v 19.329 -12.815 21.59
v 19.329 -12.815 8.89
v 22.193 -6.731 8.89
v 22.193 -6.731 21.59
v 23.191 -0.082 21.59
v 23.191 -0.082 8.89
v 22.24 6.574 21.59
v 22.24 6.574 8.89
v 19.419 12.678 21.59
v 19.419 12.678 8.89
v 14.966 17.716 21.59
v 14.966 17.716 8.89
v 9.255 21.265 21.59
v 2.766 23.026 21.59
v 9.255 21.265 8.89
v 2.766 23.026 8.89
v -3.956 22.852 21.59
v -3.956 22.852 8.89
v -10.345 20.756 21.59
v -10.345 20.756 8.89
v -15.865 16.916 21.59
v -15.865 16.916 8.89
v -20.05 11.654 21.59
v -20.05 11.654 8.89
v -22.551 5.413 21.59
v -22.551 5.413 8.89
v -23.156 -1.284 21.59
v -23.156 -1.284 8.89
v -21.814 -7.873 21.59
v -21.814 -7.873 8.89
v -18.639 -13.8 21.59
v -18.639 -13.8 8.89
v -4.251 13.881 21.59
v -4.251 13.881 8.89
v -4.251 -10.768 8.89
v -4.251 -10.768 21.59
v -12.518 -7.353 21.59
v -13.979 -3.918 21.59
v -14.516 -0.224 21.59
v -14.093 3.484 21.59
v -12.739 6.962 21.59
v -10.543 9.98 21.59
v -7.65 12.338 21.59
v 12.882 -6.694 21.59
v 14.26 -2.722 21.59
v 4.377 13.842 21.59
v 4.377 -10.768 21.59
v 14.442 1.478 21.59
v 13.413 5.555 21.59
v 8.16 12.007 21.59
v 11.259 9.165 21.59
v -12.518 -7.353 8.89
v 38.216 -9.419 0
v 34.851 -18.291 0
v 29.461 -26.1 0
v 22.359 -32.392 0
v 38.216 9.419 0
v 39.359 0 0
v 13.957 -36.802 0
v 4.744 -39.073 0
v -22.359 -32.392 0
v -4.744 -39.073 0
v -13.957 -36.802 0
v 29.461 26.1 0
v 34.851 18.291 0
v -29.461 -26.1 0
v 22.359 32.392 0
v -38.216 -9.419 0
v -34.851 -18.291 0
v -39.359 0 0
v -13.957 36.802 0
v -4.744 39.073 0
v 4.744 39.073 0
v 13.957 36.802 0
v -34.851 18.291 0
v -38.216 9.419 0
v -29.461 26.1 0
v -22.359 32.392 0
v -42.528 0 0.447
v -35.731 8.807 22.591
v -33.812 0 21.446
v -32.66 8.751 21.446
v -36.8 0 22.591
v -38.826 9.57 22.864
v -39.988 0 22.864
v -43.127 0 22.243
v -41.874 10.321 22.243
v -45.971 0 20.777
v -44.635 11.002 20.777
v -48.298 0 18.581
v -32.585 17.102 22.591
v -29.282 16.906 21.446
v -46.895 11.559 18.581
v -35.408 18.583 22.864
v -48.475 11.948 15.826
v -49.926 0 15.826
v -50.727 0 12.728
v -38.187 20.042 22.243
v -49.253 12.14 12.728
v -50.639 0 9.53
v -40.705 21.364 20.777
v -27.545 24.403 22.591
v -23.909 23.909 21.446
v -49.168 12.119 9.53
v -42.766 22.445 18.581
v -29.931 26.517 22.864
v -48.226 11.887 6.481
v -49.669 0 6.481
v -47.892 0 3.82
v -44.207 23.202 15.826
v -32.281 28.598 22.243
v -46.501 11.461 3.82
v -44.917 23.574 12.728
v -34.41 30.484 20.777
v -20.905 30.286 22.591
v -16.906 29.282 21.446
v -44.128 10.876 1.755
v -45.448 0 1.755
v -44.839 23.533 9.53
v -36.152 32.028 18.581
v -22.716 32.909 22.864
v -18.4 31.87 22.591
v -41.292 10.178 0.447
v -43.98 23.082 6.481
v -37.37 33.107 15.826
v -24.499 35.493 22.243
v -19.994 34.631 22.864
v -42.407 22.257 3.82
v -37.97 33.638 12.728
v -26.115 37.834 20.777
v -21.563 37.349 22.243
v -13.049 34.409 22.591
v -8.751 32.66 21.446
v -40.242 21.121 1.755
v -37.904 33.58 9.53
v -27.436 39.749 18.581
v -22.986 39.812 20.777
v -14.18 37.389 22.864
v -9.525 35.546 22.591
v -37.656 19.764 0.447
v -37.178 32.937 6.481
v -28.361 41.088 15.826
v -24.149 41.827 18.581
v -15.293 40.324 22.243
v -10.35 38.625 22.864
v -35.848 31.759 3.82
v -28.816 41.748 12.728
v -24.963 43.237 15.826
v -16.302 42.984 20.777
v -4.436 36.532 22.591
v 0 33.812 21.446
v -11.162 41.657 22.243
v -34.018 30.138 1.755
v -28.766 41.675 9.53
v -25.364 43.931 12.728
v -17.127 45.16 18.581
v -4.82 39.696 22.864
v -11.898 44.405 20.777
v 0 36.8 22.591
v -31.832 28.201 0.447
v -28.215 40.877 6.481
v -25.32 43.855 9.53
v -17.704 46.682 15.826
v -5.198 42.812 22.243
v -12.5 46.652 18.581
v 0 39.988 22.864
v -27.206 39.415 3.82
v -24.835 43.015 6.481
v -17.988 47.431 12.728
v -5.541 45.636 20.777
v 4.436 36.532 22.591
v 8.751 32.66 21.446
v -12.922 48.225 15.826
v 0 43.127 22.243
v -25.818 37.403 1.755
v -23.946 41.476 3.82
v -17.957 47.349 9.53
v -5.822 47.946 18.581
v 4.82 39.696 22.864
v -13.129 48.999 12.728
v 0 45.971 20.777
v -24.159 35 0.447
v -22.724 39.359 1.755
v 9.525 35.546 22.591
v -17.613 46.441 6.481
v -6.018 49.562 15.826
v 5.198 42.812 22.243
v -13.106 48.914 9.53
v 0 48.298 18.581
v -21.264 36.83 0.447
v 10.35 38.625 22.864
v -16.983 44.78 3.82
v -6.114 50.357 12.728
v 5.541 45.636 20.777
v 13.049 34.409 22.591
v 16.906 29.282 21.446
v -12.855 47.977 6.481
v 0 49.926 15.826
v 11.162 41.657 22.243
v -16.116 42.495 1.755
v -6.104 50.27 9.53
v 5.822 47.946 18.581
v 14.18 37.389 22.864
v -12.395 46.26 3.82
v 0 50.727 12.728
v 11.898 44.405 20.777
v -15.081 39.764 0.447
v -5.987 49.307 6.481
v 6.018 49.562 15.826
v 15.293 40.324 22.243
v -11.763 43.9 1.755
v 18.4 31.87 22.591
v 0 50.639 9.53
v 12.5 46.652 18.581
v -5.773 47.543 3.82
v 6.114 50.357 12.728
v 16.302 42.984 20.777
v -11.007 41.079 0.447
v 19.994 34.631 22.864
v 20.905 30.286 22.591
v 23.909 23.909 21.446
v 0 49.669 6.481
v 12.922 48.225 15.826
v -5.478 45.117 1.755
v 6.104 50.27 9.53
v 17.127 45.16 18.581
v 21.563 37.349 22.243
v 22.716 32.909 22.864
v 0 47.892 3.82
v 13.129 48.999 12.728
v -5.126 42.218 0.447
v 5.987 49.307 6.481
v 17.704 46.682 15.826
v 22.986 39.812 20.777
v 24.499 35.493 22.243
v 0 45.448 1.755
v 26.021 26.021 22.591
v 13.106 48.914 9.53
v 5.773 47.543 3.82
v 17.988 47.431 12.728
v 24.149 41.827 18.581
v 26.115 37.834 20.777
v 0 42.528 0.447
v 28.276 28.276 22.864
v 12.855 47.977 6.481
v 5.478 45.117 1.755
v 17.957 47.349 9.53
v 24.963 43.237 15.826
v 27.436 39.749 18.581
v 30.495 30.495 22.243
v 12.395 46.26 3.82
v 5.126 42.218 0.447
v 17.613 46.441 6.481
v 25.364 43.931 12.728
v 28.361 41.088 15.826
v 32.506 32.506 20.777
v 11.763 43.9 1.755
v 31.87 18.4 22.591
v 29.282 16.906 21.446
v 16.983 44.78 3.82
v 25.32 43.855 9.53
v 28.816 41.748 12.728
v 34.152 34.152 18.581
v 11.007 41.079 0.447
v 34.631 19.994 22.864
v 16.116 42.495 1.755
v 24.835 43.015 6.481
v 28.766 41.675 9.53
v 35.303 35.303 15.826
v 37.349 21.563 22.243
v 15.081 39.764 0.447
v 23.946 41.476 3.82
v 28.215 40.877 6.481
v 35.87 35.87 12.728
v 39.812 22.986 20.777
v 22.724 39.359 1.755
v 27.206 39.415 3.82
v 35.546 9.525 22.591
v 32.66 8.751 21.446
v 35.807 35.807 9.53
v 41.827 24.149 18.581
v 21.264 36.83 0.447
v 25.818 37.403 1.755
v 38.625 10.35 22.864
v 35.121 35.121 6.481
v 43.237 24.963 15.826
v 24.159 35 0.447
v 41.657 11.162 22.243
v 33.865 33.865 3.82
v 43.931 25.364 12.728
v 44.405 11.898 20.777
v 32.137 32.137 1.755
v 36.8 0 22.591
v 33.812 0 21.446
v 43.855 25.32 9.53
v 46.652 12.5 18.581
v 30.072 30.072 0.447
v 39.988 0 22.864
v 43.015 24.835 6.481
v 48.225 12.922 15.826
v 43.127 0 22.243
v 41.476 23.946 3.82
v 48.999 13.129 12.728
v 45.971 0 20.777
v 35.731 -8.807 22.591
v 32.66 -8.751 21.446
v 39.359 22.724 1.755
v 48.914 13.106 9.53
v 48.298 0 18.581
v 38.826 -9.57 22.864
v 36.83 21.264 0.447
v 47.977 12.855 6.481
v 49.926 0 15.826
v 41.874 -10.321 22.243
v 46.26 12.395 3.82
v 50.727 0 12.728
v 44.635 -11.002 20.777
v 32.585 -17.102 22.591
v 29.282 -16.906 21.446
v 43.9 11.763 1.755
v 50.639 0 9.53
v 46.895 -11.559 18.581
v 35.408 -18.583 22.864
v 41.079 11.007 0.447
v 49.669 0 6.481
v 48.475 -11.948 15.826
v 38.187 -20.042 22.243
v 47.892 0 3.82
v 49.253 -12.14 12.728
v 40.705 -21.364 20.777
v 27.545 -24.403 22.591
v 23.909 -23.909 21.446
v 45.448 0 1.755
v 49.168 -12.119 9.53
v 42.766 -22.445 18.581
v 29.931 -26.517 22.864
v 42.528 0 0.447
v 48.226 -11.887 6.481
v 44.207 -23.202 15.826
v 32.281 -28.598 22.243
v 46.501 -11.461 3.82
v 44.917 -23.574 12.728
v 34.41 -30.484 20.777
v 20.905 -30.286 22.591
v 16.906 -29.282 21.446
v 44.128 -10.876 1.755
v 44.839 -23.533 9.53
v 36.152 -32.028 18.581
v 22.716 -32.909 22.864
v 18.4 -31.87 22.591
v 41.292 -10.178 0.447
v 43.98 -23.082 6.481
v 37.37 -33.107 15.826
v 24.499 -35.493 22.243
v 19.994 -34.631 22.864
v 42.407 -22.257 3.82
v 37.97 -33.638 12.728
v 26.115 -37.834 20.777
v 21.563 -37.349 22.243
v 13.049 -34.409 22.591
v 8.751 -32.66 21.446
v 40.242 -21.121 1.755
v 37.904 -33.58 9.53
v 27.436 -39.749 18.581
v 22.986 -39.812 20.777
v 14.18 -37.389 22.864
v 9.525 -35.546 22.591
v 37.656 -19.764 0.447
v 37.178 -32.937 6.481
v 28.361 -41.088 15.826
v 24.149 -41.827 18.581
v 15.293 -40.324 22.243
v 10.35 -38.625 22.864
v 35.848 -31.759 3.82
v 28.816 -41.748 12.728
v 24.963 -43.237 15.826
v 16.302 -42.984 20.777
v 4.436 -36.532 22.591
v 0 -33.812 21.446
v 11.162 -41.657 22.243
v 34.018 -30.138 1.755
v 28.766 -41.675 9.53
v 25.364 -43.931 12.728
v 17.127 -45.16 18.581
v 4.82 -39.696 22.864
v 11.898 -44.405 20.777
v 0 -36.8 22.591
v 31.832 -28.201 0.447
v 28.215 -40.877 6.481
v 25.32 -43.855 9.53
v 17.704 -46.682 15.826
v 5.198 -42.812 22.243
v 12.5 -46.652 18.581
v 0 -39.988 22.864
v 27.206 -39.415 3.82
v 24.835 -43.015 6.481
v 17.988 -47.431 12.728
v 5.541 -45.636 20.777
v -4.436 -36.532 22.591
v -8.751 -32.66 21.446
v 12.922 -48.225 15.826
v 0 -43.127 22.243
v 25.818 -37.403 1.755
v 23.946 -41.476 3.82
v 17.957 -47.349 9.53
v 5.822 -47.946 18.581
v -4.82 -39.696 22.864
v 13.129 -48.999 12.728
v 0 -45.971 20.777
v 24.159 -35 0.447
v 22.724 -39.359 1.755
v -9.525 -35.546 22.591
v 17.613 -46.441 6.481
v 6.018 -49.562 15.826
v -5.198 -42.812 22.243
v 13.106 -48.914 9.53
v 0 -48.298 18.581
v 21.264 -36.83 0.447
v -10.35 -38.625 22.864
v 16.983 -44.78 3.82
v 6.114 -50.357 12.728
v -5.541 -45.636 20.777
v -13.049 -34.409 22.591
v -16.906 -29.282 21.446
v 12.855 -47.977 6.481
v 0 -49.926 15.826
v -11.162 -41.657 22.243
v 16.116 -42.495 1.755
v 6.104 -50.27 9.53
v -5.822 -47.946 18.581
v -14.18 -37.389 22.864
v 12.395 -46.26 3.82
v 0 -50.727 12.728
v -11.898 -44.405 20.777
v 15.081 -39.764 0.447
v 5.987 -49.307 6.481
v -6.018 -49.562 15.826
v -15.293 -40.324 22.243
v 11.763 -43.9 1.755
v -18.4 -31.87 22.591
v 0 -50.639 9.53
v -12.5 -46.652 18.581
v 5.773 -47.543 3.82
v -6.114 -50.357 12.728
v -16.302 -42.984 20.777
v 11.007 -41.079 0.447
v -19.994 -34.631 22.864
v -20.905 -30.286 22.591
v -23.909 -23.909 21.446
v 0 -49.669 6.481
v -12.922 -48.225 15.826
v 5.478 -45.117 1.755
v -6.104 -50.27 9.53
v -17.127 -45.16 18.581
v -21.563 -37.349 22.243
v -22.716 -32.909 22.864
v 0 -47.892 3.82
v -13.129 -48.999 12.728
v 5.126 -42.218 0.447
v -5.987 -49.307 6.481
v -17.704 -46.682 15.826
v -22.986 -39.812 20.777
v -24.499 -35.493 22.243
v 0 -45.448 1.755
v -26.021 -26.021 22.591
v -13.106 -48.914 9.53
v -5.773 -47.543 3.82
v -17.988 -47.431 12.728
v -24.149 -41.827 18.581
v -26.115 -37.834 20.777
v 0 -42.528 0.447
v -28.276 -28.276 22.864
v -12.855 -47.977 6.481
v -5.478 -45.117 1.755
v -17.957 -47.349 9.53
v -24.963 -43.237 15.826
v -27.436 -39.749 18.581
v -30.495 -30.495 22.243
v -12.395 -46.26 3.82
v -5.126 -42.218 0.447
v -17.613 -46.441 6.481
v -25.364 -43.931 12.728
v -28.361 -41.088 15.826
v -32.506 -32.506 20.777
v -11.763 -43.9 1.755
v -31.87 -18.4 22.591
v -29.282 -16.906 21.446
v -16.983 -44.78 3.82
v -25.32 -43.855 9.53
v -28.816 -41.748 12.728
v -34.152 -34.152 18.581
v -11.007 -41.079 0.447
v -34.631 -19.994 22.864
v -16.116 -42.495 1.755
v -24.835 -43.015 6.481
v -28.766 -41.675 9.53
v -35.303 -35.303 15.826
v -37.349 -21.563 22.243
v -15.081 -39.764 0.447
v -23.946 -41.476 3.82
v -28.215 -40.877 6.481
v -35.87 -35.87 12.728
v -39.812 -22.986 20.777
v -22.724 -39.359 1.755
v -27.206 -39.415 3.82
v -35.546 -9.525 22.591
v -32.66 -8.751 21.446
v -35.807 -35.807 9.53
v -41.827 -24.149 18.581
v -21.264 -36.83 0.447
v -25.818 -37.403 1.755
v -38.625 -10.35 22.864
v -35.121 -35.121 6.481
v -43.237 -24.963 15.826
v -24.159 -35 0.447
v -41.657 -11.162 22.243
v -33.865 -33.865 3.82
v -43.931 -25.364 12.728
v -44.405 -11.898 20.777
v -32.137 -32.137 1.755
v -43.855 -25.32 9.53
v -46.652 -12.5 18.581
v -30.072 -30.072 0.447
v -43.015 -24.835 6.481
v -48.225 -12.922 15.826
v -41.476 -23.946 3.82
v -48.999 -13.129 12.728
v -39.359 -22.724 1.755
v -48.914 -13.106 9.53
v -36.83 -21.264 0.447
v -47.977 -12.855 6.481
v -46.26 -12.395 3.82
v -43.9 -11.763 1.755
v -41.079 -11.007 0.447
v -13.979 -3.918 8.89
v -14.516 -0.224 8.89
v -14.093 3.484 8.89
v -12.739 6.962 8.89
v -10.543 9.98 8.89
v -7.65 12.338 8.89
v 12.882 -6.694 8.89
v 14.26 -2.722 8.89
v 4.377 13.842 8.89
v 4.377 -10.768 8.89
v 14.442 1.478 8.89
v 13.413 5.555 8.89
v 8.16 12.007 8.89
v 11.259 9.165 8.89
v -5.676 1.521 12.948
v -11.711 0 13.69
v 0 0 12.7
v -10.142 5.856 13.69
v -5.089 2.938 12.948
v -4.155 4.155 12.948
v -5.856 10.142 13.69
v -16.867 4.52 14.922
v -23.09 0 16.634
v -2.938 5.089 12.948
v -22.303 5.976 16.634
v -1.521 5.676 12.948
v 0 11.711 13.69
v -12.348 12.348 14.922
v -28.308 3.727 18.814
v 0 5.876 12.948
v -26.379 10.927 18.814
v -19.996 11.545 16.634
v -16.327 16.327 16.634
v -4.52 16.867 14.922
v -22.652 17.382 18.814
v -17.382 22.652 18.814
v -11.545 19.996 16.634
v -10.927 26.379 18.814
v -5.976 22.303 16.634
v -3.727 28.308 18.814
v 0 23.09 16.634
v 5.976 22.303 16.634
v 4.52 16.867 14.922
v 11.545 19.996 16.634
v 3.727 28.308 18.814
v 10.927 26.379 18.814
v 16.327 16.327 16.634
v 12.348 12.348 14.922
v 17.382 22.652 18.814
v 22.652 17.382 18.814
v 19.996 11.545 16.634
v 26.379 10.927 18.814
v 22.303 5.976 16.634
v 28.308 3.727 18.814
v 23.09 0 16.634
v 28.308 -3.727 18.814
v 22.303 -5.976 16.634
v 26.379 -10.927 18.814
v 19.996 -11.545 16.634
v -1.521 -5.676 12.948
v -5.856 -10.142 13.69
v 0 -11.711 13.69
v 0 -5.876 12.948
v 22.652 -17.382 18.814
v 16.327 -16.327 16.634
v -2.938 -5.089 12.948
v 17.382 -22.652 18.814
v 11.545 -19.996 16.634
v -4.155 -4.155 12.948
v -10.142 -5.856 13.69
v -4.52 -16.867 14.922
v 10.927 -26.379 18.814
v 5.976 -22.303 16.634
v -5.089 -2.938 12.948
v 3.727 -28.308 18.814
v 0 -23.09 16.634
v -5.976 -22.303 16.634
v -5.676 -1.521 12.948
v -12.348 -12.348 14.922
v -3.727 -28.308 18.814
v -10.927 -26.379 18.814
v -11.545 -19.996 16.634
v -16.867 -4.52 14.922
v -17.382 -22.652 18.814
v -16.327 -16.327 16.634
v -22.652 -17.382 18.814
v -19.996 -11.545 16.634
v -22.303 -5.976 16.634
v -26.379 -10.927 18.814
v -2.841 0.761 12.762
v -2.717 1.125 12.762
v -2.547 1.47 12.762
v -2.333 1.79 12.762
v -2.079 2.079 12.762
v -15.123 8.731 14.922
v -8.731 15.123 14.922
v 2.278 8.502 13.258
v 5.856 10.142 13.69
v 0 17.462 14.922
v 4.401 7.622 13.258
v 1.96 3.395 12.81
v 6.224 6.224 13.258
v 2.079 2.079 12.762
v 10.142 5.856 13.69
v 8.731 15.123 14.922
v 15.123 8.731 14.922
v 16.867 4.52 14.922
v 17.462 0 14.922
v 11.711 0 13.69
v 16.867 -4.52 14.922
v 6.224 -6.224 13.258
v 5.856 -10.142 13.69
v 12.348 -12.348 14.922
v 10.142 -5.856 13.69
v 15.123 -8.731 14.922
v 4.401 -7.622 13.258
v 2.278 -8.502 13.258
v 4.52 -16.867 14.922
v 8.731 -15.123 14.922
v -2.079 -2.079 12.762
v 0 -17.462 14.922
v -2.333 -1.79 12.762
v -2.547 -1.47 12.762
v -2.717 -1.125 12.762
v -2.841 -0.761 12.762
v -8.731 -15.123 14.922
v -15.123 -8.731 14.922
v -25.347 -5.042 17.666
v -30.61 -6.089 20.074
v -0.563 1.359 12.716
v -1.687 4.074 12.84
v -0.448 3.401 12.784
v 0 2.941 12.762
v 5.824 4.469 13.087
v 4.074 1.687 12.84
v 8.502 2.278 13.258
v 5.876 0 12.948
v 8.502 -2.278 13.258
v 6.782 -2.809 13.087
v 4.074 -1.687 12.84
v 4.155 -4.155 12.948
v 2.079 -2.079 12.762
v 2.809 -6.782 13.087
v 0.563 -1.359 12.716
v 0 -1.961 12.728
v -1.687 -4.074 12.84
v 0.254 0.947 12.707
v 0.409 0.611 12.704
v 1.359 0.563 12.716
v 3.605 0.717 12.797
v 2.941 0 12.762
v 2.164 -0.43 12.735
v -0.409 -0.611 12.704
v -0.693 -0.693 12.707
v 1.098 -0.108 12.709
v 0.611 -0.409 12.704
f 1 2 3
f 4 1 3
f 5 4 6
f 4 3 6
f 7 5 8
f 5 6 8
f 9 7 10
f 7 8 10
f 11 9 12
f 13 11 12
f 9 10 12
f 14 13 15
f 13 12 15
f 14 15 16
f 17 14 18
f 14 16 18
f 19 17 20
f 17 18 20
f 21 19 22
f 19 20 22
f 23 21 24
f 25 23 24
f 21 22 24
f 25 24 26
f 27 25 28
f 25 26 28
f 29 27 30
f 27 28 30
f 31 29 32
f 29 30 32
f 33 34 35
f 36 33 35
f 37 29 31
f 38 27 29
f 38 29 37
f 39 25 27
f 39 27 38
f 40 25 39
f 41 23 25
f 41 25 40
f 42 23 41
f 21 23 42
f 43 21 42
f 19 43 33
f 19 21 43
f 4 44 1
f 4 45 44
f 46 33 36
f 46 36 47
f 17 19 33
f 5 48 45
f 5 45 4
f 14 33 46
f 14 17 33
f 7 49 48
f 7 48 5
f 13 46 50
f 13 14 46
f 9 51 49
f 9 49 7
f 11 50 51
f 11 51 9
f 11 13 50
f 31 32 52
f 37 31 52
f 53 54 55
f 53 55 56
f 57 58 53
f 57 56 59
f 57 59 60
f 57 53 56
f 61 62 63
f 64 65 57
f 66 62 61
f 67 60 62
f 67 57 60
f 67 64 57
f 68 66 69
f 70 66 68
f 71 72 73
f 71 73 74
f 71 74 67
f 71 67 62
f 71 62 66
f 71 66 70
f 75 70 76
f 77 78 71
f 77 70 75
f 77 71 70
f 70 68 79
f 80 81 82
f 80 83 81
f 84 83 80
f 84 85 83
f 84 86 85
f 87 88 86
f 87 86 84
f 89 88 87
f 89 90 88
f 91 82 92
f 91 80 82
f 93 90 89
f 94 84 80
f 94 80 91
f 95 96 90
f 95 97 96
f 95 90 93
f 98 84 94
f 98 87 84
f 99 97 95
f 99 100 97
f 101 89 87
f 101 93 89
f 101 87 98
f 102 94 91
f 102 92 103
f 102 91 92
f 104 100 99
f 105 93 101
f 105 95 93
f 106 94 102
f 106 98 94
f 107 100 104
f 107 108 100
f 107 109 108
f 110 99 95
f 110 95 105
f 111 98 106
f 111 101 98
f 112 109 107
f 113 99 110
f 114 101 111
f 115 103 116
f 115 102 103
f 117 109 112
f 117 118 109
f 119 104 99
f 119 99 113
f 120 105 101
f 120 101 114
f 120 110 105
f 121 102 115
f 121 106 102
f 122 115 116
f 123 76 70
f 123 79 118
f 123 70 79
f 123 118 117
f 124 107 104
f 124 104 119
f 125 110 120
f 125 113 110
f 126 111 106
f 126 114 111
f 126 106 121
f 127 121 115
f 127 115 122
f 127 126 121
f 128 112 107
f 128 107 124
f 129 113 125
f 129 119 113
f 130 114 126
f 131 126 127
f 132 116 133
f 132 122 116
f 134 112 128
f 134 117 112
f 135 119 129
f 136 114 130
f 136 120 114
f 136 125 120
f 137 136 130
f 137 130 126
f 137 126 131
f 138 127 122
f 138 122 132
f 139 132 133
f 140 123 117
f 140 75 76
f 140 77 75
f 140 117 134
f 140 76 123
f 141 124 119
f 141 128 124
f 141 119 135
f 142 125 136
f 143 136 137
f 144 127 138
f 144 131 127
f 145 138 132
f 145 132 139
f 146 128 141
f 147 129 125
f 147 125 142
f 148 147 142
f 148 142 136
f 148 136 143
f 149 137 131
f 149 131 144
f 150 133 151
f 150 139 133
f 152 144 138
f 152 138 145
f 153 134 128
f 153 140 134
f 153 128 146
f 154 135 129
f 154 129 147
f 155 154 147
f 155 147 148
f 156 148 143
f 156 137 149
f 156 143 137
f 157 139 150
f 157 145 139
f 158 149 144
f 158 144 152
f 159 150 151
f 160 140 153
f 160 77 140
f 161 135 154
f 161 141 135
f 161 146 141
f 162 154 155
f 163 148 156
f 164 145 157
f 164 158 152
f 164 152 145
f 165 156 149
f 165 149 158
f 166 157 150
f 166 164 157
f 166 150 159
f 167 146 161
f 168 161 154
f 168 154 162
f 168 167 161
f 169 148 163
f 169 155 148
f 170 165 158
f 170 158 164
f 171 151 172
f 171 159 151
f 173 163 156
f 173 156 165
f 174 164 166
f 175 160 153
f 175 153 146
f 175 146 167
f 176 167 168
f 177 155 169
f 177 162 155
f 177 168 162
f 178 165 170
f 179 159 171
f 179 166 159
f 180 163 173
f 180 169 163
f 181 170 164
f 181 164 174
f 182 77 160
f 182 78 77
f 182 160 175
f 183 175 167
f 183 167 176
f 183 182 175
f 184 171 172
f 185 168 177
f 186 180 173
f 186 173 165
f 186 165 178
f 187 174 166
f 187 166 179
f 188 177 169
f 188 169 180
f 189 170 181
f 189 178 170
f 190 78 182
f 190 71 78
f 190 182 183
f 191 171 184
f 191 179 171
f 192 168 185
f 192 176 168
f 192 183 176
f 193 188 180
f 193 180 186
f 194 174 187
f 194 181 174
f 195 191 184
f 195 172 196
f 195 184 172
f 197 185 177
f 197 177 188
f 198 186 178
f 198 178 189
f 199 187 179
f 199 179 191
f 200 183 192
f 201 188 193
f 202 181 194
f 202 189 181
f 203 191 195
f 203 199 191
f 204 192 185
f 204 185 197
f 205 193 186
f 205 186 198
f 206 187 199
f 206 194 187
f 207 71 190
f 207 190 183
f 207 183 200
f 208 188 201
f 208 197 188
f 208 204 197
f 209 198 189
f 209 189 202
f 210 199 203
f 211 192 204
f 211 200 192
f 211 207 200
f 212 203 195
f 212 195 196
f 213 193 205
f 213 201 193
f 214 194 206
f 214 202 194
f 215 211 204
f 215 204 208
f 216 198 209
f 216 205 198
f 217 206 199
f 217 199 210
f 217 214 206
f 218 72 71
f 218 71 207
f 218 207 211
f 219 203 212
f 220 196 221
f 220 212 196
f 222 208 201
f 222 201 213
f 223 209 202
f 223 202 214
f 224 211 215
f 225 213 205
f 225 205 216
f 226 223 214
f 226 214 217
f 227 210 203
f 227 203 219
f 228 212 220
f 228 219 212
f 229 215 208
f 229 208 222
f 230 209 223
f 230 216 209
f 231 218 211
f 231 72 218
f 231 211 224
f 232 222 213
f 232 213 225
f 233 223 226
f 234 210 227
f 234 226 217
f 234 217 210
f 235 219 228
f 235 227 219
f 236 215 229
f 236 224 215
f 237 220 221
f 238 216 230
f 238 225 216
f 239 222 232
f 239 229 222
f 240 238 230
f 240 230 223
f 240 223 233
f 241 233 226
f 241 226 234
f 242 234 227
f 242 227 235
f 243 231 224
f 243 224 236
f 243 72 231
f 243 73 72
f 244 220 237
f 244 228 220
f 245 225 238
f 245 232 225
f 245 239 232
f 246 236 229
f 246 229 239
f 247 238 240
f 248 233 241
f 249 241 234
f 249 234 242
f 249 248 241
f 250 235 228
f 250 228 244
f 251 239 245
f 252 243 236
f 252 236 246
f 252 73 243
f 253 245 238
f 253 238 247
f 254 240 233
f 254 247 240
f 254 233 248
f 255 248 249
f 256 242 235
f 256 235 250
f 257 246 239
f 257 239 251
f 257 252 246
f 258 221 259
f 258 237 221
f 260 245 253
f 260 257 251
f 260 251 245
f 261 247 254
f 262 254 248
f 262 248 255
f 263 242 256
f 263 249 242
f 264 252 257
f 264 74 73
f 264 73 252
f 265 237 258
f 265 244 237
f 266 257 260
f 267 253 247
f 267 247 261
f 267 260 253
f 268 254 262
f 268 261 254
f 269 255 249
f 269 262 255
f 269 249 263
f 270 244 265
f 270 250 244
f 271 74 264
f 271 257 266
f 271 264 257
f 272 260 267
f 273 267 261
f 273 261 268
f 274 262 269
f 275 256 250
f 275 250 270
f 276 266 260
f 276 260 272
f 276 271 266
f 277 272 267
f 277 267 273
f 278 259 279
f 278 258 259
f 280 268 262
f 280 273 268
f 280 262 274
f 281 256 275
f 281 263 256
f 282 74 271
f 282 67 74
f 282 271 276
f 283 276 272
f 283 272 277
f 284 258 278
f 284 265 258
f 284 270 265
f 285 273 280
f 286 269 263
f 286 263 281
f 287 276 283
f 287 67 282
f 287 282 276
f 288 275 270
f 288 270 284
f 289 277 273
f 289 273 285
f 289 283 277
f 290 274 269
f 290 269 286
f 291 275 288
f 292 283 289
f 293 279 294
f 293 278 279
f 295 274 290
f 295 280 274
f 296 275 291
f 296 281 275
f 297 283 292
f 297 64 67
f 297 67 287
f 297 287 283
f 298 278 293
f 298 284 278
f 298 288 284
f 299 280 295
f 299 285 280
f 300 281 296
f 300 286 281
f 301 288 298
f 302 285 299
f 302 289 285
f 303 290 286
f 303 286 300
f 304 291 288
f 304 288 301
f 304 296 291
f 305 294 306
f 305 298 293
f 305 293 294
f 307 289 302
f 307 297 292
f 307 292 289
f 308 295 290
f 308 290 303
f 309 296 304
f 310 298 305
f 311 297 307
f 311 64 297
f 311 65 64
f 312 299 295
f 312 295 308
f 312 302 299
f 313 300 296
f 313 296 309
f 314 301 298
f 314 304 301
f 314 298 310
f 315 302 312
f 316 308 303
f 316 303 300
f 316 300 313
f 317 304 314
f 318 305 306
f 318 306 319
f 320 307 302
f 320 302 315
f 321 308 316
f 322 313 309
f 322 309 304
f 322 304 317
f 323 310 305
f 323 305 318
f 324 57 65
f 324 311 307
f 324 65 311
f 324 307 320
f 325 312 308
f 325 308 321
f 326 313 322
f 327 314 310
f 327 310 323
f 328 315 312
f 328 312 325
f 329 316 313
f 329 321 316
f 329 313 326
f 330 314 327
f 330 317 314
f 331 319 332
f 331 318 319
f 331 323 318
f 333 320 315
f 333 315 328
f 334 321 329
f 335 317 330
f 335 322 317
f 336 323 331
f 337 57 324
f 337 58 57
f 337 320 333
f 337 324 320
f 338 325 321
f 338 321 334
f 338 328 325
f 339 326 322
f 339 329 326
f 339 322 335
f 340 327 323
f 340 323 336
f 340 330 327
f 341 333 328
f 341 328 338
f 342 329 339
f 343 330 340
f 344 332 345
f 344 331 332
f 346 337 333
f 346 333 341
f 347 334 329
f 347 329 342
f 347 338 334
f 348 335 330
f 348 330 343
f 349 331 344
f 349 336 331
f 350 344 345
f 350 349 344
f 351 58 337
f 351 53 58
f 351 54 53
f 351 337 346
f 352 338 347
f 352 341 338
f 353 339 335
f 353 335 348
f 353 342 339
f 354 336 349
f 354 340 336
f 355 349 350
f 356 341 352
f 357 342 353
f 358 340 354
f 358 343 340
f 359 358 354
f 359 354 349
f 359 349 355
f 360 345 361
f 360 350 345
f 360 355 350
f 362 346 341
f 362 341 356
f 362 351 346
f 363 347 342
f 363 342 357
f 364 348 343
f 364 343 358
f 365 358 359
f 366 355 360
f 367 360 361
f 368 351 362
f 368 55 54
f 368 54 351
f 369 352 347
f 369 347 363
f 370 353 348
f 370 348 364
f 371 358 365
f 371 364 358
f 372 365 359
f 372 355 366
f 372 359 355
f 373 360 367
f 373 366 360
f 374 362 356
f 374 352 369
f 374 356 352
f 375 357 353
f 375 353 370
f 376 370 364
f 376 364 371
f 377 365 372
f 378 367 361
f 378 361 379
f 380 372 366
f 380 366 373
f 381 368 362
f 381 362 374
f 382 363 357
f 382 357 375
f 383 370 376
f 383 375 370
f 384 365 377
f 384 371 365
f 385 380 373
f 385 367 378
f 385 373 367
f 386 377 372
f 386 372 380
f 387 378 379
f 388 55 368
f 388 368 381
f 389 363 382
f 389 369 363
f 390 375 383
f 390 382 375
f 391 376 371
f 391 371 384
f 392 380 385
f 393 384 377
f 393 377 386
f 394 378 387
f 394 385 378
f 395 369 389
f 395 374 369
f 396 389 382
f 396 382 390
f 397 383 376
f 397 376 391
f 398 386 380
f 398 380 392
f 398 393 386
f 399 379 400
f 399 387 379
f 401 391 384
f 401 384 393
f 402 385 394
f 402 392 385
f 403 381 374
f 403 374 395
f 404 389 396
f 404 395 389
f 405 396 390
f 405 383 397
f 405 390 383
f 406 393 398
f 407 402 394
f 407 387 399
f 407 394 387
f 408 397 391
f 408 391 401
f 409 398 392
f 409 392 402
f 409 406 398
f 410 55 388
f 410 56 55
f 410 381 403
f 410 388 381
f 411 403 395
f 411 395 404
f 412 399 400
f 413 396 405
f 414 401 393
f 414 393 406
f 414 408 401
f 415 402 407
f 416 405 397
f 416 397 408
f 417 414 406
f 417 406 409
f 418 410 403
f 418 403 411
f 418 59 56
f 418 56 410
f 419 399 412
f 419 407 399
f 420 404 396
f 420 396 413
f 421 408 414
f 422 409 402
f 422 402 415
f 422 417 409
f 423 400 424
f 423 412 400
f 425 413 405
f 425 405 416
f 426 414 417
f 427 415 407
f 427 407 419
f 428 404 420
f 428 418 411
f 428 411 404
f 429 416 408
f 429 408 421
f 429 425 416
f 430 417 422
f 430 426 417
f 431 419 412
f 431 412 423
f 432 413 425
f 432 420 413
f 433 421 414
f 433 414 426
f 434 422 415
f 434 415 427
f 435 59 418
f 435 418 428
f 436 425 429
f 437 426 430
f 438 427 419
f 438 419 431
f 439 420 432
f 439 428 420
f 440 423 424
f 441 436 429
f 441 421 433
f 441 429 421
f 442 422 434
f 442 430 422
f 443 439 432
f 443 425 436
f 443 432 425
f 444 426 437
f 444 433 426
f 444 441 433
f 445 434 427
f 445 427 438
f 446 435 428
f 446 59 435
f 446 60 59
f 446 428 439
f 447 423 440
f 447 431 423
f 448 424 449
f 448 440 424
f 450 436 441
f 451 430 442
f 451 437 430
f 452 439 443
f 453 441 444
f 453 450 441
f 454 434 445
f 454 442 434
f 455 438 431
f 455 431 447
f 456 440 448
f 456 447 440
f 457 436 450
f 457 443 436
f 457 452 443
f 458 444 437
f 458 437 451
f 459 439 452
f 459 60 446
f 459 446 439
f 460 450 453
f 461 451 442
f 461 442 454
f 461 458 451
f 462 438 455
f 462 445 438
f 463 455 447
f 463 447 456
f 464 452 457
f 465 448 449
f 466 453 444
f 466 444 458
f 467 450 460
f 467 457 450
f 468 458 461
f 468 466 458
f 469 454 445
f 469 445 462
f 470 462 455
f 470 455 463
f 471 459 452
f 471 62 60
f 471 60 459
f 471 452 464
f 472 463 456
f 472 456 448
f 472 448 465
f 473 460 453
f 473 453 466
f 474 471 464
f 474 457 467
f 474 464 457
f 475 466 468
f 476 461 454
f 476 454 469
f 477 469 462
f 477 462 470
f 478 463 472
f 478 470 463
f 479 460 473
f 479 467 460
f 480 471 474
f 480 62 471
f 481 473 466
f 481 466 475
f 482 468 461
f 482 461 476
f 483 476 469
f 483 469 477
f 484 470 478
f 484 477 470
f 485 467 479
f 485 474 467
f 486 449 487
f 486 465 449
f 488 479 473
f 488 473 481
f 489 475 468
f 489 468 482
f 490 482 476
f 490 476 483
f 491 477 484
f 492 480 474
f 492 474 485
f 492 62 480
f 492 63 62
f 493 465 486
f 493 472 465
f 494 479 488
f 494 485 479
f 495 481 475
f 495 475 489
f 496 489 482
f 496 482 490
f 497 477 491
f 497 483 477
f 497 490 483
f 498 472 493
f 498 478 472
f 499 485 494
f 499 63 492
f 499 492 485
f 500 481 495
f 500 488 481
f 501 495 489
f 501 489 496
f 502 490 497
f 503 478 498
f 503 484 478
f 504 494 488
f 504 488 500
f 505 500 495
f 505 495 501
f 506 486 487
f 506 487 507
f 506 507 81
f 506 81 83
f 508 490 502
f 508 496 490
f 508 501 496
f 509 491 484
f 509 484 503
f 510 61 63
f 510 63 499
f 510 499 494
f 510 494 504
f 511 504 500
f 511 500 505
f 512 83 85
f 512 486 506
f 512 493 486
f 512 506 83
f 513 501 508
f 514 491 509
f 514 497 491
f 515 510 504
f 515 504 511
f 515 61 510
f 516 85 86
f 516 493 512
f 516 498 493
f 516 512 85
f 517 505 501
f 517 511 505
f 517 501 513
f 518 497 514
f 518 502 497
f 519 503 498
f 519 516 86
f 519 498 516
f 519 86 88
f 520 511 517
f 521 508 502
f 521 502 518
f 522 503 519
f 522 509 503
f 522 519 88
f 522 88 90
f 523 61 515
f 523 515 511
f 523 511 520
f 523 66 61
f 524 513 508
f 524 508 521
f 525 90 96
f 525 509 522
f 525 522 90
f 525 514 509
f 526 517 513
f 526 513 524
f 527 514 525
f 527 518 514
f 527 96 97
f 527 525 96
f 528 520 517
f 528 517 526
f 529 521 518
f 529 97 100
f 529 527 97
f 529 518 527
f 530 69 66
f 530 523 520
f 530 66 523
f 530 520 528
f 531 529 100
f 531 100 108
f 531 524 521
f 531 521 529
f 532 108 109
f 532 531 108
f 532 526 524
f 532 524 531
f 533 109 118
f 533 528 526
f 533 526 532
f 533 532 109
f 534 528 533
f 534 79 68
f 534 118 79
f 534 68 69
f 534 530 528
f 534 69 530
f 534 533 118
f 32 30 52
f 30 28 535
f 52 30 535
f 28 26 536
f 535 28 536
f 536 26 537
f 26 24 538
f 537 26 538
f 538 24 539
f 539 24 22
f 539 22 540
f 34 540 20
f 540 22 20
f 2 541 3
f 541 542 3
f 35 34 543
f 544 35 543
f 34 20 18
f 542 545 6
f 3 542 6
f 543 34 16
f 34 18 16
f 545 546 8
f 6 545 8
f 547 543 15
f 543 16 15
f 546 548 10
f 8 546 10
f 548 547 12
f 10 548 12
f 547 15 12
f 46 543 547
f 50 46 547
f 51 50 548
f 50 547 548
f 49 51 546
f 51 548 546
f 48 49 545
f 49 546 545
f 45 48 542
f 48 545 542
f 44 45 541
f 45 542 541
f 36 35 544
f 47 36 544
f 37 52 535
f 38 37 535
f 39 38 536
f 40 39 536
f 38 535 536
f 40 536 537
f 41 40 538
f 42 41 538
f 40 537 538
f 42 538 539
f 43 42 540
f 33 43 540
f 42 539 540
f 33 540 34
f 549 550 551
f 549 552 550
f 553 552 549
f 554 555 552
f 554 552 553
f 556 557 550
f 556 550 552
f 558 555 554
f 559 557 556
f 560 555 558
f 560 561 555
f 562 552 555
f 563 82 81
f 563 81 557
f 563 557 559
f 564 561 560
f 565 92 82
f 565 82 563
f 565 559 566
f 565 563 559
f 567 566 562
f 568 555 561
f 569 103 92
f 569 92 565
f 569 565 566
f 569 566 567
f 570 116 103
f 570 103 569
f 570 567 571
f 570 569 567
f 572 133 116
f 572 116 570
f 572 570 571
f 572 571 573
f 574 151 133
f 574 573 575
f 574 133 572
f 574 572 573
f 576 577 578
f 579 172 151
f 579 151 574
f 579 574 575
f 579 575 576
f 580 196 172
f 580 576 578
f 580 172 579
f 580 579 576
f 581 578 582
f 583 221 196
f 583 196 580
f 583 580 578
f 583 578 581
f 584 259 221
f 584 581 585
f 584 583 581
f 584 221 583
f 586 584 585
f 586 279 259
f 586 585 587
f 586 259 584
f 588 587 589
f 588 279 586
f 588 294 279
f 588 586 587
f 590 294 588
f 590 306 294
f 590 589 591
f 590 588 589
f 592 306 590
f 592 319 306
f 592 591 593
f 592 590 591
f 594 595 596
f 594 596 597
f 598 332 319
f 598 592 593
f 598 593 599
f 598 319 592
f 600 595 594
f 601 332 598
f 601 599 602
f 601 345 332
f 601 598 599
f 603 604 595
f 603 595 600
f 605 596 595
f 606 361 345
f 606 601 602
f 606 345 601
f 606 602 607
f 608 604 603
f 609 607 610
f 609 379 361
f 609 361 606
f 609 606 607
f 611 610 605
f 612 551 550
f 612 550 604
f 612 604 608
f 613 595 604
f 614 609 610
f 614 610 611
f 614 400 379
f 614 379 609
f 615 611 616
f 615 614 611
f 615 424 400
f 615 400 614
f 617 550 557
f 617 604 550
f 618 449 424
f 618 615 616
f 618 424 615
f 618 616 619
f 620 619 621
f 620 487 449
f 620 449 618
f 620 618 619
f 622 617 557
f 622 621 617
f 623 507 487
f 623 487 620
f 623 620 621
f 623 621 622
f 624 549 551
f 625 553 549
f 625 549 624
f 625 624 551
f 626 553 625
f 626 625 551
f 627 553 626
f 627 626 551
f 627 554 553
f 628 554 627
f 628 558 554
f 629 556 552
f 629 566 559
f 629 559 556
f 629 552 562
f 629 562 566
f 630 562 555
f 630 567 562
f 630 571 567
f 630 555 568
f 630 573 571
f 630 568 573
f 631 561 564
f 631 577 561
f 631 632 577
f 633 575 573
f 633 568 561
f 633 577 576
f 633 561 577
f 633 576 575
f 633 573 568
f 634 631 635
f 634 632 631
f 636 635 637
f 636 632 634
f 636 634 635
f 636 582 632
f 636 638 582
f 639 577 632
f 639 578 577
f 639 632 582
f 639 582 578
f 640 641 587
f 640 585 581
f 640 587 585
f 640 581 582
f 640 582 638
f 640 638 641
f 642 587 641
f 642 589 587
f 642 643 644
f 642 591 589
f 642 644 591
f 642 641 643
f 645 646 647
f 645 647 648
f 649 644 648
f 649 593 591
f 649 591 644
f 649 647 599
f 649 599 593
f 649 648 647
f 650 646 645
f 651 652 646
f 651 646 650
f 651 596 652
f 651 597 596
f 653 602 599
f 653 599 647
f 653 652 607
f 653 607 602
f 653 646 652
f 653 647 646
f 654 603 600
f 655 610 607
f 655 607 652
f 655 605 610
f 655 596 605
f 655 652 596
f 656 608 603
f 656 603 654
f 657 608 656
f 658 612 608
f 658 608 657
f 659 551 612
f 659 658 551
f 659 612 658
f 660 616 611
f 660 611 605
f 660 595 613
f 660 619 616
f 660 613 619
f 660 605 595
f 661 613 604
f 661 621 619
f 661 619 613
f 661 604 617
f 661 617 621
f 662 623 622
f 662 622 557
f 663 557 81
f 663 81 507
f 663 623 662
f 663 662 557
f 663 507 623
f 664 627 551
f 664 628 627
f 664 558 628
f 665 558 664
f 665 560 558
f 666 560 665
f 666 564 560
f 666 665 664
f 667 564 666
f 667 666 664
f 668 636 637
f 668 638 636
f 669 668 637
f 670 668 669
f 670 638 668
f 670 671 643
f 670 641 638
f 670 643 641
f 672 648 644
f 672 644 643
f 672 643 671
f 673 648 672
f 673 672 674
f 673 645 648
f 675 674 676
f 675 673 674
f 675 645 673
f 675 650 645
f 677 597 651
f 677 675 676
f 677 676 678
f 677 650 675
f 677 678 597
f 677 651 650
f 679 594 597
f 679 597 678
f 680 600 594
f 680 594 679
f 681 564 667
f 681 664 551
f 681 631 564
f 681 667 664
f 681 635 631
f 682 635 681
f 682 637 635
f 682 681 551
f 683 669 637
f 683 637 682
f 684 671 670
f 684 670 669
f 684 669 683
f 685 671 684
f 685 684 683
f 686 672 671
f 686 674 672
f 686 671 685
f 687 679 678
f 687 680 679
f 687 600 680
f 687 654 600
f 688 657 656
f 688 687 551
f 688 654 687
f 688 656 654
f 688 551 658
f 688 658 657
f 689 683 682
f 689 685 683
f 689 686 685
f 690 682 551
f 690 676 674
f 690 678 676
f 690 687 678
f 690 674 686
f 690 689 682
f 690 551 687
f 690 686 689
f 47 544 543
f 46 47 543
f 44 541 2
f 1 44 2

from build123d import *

# Parameters (mm, degrees)
F4_DEPTH = 12.7
F5_DEPTH = 0.762


with BuildPart() as f1:
    # F0 (on Front) → F1 (revolve)
    with BuildSketch(Plane.XZ):
        with BuildLine():
            ThreePointArc((0, 12.7), (-17.462475, 14.921919), (-33.812103, 21.446078))
            ThreePointArc((-33.812103, 21.446078), (-50.43546, 14.30549), (-39.359497, 0))
            Line((-39.359497, 0), (0, 0))
            Line((0, 0), (0, 12.7))
        make_face()
    revolve(axis=Axis((0, 0, 6.35), (0, 0, -1)))


with BuildPart() as f4:
    # F3 (on offset) → F4 (new body)
    with BuildSketch(Plane.XY.offset(8.89)):
        with BuildLine():
            Line((12.882156, -6.693991), (19.329203, -12.815075))
            ThreePointArc((19.329203, -12.815075), (-0.601284, 23.183674), (-18.638929, -13.799804))
            Line((-18.638929, -13.799804), (-12.517844, -7.352757))
            ThreePointArc((-12.517844, -7.352757), (-13.528485, 5.266834), (-4.251169, 13.881175))
            Line((-4.251169, 13.881175), (-4.251169, -10.768405))
            Line((-4.251169, -10.768405), (4.377302, -10.768405))
            Line((4.377302, -10.768405), (4.377302, 13.841917))
            ThreePointArc((4.377302, 13.841917), (13.412796, 5.554849), (12.882156, -6.693991))
        make_face()
    extrude(amount=F4_DEPTH)

    # F3 (on offset) → F5 (join)
    with BuildSketch(Plane.XY.offset(8.89)):
        with BuildLine():
            Line((12.882156, -6.693991), (19.329203, -12.815075))
            ThreePointArc((19.329203, -12.815075), (-0.601284, 23.183674), (-18.638929, -13.799804))
            Line((-18.638929, -13.799804), (-12.517844, -7.352757))
            ThreePointArc((-12.517844, -7.352757), (-13.528485, 5.266834), (-4.251169, 13.881175))
            Line((-4.251169, 13.881175), (-4.251169, -10.768405))
            Line((-4.251169, -10.768405), (4.377302, -10.768405))
            Line((4.377302, -10.768405), (4.377302, 13.841917))
            ThreePointArc((4.377302, 13.841917), (13.412796, 5.554849), (12.882156, -6.693991))
        make_face()
    extrude(amount=F5_DEPTH)


solid = Compound([f1.part, f4.part])
